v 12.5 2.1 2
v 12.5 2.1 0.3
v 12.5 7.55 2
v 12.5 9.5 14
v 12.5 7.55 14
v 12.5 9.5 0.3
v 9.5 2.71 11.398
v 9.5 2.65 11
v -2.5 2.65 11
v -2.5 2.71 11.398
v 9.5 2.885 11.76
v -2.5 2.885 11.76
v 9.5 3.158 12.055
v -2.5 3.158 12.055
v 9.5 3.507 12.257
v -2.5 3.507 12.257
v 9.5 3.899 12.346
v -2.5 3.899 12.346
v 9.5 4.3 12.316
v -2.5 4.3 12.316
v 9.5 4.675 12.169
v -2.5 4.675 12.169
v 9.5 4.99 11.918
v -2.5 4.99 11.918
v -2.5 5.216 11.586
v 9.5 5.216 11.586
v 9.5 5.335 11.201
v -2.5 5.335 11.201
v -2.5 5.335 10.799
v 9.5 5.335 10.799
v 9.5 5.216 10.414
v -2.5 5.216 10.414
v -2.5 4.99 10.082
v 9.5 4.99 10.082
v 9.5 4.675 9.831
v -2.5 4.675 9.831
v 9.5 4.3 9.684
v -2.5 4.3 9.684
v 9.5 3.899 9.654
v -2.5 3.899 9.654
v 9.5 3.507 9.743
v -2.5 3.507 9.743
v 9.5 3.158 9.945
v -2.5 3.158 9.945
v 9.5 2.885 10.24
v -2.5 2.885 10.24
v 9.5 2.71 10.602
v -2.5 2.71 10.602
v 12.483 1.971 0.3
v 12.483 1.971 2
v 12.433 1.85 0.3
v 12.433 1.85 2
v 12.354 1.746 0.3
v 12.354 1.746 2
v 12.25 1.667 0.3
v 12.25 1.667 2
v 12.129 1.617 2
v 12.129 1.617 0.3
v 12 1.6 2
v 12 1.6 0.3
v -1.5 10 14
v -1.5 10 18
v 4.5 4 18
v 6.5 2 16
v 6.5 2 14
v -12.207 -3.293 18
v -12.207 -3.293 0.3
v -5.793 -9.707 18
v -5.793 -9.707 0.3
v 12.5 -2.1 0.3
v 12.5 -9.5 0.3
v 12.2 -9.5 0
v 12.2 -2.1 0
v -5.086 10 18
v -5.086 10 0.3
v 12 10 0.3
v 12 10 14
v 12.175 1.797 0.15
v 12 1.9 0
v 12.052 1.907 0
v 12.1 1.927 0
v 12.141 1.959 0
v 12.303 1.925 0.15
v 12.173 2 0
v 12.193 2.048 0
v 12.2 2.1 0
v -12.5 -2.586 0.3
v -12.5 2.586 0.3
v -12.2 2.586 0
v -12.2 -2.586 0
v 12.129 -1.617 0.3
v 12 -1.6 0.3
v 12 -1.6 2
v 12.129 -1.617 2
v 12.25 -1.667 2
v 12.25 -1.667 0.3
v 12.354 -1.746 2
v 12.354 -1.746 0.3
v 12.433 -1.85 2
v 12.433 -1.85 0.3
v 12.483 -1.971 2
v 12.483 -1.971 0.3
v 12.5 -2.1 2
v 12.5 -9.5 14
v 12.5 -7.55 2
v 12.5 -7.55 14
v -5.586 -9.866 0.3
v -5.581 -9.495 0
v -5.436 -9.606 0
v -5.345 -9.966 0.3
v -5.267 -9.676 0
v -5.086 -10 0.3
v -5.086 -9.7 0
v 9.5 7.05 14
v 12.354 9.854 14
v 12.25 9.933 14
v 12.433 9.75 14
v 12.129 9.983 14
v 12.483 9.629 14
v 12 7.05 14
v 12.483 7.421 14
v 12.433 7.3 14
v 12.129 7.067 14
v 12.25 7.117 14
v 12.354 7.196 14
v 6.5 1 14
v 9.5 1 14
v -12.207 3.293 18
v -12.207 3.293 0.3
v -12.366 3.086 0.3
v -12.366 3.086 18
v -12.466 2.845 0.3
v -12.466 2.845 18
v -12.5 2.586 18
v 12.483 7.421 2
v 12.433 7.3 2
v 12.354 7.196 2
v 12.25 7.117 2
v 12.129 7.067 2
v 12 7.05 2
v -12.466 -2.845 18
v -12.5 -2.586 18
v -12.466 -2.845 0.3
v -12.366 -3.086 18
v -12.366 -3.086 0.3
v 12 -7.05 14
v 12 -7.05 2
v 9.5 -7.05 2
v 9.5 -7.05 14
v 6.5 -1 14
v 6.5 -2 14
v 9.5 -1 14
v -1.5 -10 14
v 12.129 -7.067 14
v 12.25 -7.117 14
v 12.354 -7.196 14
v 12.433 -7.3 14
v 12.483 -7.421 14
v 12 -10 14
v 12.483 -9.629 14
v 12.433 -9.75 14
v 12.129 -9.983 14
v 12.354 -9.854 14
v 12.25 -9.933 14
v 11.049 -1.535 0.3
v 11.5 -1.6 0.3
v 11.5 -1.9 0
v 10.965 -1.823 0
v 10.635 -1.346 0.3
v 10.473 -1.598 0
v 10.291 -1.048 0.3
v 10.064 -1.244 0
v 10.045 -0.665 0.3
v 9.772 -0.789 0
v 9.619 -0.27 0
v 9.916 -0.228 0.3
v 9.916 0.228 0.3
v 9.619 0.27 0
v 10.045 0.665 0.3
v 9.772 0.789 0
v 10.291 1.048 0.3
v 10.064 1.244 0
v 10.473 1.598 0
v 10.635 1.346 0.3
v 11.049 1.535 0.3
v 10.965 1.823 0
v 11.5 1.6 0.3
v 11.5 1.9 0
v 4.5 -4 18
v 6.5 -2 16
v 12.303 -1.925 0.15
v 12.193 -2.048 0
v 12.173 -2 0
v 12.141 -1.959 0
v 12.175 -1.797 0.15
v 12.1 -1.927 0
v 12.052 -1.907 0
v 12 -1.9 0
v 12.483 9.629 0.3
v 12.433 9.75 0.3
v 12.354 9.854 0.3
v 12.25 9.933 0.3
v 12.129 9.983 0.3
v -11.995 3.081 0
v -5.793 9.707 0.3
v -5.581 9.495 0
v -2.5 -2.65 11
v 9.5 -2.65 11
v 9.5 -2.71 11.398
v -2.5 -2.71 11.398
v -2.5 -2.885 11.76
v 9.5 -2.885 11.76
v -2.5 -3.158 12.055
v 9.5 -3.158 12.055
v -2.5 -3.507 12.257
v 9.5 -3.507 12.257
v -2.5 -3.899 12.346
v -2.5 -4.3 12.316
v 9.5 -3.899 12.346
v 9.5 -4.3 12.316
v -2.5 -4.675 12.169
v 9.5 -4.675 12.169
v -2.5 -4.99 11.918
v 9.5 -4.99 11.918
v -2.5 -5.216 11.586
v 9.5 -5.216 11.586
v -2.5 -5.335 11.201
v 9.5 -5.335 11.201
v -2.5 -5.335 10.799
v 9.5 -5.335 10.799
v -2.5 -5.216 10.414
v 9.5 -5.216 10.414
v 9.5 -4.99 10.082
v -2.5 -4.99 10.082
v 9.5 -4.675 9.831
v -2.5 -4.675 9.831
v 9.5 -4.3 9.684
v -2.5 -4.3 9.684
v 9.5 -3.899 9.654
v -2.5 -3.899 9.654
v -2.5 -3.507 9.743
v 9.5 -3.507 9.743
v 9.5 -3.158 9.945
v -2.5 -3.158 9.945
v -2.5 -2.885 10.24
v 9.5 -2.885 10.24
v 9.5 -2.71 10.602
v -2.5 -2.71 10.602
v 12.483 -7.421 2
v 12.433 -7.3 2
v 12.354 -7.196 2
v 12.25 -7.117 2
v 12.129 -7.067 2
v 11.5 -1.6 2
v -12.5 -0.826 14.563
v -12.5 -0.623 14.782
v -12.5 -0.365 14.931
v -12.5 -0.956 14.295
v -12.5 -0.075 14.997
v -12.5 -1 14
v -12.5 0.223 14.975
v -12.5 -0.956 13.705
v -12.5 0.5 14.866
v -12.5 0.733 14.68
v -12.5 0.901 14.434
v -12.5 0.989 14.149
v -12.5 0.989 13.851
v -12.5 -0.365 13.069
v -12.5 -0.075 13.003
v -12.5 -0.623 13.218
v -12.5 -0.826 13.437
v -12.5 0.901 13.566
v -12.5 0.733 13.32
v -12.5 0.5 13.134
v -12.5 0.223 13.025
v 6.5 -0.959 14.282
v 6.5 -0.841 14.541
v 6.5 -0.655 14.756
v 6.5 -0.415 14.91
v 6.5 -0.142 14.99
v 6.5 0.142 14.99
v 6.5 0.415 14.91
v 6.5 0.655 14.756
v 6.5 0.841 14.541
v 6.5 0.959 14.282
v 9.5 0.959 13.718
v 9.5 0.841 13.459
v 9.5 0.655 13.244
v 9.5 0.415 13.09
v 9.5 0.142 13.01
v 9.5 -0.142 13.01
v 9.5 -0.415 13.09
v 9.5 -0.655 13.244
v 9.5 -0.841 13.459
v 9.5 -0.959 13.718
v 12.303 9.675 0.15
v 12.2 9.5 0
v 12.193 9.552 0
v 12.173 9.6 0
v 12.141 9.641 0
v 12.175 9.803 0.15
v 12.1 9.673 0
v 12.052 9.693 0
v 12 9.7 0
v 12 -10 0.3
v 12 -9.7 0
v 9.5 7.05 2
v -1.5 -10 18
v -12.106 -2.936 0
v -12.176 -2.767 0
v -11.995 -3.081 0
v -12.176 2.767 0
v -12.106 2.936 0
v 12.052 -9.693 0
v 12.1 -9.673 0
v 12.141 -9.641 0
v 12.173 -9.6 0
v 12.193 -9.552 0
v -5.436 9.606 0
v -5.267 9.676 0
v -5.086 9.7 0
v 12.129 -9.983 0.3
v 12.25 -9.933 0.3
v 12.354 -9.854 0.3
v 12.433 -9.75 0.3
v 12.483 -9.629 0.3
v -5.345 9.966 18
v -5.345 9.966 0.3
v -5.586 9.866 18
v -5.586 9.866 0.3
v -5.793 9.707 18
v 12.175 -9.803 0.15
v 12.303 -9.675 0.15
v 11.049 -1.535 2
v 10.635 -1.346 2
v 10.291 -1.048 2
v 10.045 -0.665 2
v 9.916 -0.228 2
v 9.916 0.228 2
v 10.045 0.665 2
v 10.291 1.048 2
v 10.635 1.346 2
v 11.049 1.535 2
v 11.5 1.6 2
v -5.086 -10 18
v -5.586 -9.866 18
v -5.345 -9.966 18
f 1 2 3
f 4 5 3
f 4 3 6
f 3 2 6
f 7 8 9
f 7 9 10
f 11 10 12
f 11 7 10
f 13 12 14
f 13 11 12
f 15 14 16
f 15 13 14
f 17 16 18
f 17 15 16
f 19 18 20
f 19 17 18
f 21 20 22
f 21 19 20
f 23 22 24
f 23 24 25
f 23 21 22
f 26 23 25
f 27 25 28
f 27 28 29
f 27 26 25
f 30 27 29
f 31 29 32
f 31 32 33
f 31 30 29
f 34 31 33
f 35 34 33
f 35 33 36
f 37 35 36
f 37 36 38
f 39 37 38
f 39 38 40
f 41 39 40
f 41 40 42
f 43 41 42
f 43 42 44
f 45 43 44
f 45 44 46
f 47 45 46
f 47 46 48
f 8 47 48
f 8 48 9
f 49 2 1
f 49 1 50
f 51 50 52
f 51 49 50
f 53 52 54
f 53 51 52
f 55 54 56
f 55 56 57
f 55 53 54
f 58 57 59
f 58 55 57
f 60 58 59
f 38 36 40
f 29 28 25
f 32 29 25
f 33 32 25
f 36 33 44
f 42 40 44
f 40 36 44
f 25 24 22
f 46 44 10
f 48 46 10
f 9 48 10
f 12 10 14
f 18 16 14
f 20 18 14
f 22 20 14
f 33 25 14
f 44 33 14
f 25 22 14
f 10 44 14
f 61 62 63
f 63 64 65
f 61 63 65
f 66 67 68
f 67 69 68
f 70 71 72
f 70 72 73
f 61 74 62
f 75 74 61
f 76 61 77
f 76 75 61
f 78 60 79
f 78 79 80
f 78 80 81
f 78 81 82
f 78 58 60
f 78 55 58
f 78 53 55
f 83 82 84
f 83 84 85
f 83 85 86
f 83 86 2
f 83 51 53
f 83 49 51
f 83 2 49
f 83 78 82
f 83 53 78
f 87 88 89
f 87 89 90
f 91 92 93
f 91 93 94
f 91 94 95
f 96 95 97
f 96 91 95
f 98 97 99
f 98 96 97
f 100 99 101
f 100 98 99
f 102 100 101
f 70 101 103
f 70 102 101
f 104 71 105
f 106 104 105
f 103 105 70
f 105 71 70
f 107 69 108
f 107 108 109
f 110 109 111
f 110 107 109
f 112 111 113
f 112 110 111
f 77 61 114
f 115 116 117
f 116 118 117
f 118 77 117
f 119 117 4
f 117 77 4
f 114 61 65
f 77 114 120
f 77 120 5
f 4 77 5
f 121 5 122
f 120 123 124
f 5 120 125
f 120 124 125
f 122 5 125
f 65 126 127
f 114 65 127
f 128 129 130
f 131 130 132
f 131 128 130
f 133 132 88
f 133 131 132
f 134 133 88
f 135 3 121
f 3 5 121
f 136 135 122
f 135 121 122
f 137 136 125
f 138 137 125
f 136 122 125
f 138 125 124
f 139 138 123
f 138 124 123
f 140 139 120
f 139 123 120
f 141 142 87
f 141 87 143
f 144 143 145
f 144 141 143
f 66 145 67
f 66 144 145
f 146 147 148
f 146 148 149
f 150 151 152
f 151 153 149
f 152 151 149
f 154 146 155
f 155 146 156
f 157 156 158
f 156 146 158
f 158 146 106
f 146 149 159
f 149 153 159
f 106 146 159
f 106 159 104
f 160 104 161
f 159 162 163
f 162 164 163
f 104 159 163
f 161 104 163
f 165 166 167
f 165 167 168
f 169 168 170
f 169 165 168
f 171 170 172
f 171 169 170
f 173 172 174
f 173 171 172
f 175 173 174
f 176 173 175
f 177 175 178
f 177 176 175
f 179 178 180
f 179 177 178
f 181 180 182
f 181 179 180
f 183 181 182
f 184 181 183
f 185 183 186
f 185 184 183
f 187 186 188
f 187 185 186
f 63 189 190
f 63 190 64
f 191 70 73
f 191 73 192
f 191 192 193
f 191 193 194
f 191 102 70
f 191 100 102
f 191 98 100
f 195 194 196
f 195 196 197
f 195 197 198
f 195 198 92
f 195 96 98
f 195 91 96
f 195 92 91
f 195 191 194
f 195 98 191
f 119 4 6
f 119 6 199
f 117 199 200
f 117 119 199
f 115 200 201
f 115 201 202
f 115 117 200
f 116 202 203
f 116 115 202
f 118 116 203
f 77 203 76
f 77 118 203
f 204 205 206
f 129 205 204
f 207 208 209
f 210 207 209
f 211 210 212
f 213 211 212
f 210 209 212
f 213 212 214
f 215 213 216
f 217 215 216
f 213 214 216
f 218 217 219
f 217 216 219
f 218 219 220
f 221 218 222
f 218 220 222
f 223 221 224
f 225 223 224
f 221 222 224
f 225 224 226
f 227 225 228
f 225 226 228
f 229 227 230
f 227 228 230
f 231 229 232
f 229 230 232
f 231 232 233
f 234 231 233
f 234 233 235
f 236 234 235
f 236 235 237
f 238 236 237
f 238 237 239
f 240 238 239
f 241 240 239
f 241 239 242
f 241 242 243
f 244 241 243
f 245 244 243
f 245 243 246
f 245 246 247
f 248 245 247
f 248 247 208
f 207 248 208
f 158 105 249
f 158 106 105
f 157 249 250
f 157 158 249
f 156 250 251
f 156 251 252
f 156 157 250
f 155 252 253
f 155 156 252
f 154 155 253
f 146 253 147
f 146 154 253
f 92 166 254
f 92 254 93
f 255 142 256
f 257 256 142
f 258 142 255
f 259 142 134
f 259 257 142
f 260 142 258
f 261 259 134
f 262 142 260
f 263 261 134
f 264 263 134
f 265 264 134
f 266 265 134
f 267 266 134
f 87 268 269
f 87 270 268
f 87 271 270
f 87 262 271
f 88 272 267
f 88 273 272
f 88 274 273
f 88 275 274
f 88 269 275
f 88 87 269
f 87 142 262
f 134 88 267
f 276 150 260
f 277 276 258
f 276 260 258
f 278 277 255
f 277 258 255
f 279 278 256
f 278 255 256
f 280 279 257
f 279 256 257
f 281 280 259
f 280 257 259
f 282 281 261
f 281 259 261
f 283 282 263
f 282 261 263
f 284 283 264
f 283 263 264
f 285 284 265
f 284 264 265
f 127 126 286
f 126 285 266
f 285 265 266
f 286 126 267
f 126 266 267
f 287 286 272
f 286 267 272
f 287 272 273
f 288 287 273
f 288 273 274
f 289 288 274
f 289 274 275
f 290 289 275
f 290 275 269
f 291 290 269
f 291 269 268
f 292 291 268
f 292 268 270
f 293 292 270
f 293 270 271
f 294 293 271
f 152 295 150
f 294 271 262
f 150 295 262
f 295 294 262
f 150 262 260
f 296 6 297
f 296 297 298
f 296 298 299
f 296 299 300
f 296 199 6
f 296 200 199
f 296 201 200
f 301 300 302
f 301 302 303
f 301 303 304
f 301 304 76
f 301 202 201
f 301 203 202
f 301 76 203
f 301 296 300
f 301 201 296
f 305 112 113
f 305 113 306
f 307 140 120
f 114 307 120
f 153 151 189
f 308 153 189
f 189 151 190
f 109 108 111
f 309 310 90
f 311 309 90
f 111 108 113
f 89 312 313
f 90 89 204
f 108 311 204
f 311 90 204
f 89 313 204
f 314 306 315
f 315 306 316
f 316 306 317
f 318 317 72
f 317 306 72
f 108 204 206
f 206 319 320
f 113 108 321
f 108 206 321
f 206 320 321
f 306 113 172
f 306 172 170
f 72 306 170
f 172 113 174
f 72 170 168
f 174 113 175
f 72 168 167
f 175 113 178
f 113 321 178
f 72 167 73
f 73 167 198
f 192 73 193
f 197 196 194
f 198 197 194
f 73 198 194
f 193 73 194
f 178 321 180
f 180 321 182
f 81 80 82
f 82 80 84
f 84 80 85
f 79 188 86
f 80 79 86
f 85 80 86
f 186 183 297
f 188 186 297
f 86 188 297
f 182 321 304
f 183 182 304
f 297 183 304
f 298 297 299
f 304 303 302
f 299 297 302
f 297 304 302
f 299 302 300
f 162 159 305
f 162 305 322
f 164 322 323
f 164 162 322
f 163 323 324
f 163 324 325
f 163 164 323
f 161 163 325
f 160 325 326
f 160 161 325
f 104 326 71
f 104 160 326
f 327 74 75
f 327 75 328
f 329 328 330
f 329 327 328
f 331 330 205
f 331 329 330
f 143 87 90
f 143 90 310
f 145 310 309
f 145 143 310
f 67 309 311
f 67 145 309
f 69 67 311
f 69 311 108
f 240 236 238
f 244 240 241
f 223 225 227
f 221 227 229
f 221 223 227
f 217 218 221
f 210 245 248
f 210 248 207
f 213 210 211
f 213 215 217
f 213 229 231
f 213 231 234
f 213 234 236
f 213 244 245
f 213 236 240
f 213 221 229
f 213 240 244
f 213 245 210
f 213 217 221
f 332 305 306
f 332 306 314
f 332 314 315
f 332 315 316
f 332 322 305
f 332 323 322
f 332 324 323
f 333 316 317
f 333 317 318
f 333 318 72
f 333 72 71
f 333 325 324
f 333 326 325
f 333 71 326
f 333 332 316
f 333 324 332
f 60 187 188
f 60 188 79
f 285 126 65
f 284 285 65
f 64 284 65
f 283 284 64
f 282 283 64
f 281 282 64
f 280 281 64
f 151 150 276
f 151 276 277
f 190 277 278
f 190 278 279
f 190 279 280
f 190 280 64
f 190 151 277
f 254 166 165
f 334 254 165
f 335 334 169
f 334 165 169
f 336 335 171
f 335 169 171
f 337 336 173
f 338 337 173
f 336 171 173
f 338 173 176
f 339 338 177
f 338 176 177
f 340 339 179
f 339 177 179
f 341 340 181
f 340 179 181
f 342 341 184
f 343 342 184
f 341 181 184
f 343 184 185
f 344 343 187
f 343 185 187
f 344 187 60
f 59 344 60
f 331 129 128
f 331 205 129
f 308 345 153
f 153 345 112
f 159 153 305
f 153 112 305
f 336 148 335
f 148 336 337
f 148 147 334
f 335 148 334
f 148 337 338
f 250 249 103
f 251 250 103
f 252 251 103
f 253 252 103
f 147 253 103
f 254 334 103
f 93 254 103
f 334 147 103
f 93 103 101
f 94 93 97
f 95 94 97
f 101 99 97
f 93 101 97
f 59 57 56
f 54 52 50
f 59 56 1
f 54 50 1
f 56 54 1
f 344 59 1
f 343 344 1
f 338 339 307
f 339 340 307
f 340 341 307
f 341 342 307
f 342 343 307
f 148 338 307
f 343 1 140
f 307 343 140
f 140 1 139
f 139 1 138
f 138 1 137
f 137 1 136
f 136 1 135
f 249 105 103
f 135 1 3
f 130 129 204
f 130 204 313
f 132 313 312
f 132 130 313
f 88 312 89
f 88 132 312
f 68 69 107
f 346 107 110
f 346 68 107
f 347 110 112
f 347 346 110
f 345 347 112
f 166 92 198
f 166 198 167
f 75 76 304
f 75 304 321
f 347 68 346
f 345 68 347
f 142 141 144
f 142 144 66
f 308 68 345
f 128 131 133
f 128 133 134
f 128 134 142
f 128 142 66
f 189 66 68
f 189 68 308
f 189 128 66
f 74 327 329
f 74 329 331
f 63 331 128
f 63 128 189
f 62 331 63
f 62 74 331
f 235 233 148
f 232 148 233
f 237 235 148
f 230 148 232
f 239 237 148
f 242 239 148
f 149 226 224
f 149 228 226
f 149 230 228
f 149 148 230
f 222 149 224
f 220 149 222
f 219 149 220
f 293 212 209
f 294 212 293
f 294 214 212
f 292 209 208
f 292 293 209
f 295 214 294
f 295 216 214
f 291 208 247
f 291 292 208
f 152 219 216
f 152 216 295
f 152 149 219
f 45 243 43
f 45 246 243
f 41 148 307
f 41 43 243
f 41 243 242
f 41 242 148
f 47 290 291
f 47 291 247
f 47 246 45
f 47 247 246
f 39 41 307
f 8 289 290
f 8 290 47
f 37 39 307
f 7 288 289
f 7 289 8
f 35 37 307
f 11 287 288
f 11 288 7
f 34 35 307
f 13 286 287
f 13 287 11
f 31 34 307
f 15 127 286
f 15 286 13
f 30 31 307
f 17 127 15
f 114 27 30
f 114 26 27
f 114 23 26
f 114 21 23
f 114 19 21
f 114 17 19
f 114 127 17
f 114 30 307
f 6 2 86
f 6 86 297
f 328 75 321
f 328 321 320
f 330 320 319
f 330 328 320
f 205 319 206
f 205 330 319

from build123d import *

# Parameters (mm, degrees)
SKETCH_W        = 25
SKETCH_H        = 20
PAD_DEPTH       = 18
SKETCH001_R     = 1
POCKET_DEPTH    = 25.001
SKETCH002_W     = 6
SKETCH002_H     = 8
POCKET001_DEPTH = 20.001
SKETCH003_R     = 1.35
POCKET002_DEPTH = 15
CHAMFER_SIZE    = 8
CHAMFER001_SIZE = 2
SKETCH004_W     = 14.1
SKETCH004_H     = 13
POCKET003_DEPTH = 3
FILLET_R        = 0.5
CHAMFER002_SIZE = 7
FILLET001_R     = 1
POCKET004_DEPTH = 5
FILLET002_R     = 0.5
CHAMFER003_SIZE = 0.3


with BuildPart() as part:
    # Sketch (on XY_Plane of Origin) → Pad (new body)
    with BuildSketch(Plane.XY):
        Rectangle(SKETCH_W, SKETCH_H)
    extrude(amount=PAD_DEPTH)

    # Sketch001 (on Face4 of Pad) → Pocket (cut, through all)
    with BuildSketch(Plane(origin=(-12.5, 0, 0), x_dir=(0, -1, 0), z_dir=(-1, 0, 0))):
        with Locations((0, 14)):
            Circle(SKETCH001_R)
    extrude(amount=-POCKET_DEPTH, mode=Mode.SUBTRACT)

    # Sketch002 (on Face1 of Pocket) → Pocket001 (cut, through all)
    with BuildSketch(Plane.XZ.offset(10)):
        with Locations((9.5, 18)):
            Rectangle(SKETCH002_W, SKETCH002_H)
    extrude(amount=-POCKET001_DEPTH, mode=Mode.SUBTRACT)

    # Sketch003 (on Face3 of Pocket001) → Pocket002 (cut)
    with BuildSketch(Plane.YZ.offset(12.5)):
        with Locations((-4, 11)):
            Circle(SKETCH003_R)
    pocket002 = extrude(amount=-POCKET002_DEPTH, mode=Mode.SUBTRACT)

    # Mirrored: Pocket002 across XZ
    add(pocket002.mirror(Plane.XZ), mode=Mode.SUBTRACT)

    # Chamfer
    chamfer_edges = [part.edges().sort_by_distance(p)[0] for p in [
        (6.5, -10, 16),
        (6.5, 10, 16),
    ]]
    chamfer(chamfer_edges, length=CHAMFER_SIZE)

    # Chamfer001
    chamfer001_edges = [part.edges().sort_by_distance(p)[0] for p in [
        (6.5, 0, 18),
    ]]
    chamfer(chamfer001_edges, length=CHAMFER001_SIZE)

    # Sketch004 (on Face11 of Chamfer001) → Pocket003 (cut)
    with BuildSketch(Plane.YZ.offset(12.5)):
        with Locations((0, 8.5)):
            Rectangle(SKETCH004_W, SKETCH004_H)
    extrude(amount=-POCKET003_DEPTH, mode=Mode.SUBTRACT)

    # Fillet
    fillet_edges = [part.edges().sort_by_distance(p)[0] for p in [
        (12.5, -10, 7),
        (12.5, -7.05, 8),
        (12.5, 7.05, 8),
        (12.5, 10, 7),
    ]]
    fillet(fillet_edges, radius=FILLET_R)

    # Chamfer002
    chamfer002_edges = [part.edges().sort_by_distance(p)[0] for p in [
        (-12.5, -10, 9),
        (-12.5, 10, 9),
    ]]
    chamfer(chamfer002_edges, length=CHAMFER002_SIZE)

    # Fillet001
    fillet001_edges = [part.edges().sort_by_distance(p)[0] for p in [
        (-12.5, -3, 9),
        (-5.5, -10, 9),
        (-12.5, 3, 9),
        (-5.5, 10, 9),
    ]]
    fillet(fillet001_edges, radius=FILLET001_R)

    # Sketch005 (on Face2 of Fillet001) → Pocket004 (cut)
    with BuildSketch(Plane(origin=(0, 0, 0), x_dir=(1, 0, 0), z_dir=(0, 0, -1))):
        with BuildLine():
            ThreePointArc((11.5, 1.6), (9.9, 0), (11.5, -1.6))
            Line((11.5, -1.6), (21.5, -1.6))
            ThreePointArc((21.5, -1.6), (23.1, 0), (21.5, 1.6))
            Line((11.5, 1.6), (21.5, 1.6))
        make_face()
    extrude(amount=-POCKET004_DEPTH, mode=Mode.SUBTRACT)

    # Fillet002
    fillet002_edges = [part.edges().sort_by_distance(p)[0] for p in [
        (12.5, 1.6, 1),
        (12.5, -1.6, 1),
    ]]
    fillet(fillet002_edges, radius=FILLET002_R)

    # Chamfer003
    chamfer003_edges = [part.edges().sort_by_distance(p)[0] for p in [
        (3.457107, -10, 0),
    ]]
    chamfer(chamfer003_edges, length=CHAMFER003_SIZE)


solid = part.part
